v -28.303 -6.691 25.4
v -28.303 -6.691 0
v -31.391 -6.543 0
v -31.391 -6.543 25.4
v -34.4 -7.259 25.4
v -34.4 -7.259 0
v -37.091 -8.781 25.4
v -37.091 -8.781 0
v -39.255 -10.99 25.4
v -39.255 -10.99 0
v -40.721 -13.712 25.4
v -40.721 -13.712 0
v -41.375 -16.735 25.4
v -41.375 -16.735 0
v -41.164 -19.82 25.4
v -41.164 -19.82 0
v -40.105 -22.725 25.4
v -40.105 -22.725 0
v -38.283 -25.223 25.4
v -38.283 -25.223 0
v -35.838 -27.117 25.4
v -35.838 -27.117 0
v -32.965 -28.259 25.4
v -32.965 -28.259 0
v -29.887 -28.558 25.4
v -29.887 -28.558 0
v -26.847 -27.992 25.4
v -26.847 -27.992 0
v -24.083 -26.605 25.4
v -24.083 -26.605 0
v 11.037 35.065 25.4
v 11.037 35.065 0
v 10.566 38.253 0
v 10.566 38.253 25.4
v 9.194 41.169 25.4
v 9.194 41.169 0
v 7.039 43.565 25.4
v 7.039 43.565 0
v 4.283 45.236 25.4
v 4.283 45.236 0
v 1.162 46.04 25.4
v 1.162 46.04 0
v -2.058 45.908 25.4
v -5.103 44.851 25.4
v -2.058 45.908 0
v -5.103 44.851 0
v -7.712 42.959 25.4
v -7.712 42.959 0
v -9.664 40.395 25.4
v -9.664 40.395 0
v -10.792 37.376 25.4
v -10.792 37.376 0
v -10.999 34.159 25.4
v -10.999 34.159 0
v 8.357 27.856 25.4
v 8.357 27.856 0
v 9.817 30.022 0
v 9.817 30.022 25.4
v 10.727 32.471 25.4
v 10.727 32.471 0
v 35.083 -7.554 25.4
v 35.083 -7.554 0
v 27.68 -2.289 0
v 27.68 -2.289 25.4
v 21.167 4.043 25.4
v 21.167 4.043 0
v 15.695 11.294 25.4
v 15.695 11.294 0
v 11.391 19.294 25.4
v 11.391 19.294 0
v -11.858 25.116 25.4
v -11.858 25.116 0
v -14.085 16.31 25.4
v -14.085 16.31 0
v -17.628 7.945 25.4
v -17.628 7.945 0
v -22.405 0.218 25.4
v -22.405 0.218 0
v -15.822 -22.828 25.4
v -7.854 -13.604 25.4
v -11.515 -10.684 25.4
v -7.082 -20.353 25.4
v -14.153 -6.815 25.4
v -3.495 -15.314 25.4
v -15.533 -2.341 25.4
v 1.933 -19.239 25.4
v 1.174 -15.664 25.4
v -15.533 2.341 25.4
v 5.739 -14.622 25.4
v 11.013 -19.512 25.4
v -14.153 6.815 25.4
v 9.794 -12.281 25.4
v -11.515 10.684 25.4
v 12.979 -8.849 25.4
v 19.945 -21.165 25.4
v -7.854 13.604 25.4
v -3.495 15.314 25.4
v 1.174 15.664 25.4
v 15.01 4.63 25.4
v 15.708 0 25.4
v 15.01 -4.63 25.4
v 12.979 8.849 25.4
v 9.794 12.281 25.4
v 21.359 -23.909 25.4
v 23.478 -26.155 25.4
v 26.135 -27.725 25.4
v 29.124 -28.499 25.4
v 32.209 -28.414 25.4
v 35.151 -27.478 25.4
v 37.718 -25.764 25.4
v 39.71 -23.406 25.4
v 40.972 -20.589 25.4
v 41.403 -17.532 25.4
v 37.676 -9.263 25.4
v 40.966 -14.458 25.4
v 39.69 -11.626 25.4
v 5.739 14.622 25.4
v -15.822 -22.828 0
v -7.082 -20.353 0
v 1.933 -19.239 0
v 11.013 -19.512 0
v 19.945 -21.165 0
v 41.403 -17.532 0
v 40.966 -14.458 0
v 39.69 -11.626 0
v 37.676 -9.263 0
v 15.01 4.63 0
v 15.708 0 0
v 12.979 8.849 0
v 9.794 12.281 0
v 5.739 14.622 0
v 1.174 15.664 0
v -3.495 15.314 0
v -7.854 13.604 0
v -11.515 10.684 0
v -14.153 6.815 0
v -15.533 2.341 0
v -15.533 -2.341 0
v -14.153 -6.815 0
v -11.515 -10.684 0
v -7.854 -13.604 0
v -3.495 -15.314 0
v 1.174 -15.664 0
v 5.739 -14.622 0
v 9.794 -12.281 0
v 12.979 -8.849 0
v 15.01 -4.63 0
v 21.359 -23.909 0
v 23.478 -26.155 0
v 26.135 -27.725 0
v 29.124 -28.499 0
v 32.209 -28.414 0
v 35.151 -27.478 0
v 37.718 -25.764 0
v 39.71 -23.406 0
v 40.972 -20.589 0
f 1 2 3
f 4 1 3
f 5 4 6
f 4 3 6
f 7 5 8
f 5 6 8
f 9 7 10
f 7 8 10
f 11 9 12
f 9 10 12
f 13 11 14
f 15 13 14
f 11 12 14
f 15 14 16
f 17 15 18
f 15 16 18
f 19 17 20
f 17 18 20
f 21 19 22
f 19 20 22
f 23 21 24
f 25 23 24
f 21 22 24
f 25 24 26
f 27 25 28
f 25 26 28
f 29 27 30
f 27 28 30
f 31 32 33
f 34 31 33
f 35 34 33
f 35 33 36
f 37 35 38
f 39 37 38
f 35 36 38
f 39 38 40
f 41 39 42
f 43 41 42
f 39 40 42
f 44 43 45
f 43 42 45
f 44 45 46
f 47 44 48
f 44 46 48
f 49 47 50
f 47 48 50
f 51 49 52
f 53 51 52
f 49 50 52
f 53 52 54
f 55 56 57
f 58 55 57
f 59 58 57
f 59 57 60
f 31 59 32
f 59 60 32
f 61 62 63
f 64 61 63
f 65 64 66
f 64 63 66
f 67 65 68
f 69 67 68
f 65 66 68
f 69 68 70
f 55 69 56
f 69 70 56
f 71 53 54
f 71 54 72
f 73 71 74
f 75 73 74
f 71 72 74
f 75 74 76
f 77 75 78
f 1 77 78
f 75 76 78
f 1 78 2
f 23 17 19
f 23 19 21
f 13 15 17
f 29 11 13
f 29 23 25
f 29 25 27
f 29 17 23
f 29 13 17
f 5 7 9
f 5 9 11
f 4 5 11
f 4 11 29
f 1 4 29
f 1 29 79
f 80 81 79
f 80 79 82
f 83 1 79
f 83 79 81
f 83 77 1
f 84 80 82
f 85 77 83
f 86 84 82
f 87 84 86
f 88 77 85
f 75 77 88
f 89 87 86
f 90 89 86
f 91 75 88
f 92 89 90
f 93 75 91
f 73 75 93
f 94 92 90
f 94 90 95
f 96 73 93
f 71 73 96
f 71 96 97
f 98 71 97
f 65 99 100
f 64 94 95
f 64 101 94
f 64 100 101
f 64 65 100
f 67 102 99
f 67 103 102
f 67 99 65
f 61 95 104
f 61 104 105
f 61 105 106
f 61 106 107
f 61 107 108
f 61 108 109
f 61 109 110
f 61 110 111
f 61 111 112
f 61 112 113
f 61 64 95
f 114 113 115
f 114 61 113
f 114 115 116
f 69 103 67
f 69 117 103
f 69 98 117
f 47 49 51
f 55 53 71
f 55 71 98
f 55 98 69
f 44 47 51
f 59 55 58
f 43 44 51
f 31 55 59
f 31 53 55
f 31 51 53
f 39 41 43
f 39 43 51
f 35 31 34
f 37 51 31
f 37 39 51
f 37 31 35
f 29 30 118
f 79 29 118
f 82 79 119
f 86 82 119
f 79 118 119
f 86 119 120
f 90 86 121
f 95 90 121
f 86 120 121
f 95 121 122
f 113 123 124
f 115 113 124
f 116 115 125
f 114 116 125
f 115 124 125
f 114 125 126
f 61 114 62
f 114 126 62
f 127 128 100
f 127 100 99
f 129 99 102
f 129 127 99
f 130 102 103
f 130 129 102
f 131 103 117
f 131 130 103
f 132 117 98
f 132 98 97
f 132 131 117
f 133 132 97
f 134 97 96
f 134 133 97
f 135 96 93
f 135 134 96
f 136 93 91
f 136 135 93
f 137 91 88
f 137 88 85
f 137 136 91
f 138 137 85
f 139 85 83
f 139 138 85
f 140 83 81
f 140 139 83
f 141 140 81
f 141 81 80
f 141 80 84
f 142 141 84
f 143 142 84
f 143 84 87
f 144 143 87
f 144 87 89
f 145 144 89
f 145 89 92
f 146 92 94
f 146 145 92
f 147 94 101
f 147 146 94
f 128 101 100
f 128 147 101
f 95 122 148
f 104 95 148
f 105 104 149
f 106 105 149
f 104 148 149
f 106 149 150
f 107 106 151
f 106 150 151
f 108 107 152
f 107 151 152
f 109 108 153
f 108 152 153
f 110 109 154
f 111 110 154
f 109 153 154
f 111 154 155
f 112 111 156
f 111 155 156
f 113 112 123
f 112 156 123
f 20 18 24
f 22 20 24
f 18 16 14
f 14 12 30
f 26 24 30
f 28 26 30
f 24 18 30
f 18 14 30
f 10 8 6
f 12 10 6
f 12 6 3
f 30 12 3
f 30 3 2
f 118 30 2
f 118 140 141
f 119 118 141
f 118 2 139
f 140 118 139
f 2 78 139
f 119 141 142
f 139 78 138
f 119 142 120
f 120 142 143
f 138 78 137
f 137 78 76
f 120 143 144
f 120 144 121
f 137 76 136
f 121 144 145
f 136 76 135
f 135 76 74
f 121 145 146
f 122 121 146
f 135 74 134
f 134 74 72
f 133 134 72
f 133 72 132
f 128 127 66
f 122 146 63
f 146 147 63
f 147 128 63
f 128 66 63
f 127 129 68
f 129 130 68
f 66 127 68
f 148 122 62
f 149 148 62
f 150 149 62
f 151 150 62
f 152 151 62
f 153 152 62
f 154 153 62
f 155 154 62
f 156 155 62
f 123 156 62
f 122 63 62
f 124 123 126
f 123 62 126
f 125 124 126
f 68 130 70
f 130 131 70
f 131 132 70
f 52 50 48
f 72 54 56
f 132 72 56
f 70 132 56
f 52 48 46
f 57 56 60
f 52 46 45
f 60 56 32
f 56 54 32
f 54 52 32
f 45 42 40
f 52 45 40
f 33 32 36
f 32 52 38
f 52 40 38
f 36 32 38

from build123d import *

# Parameters (mm, degrees)
F0_R     = 15.708112
F1_DEPTH = 25.4


with BuildPart() as f1:
    # F0 (on Top) → F1 (new body)
    with BuildSketch(Plane.XY):
        with BuildLine():
            ThreePointArc((8.357053, 27.856014), (10.344975, 31.219382), (11.036502, 35.064623))
            ThreePointArc((11.036502, 35.064623), (-0.452947, 46.091827), (-10.999324, 34.159493))
            ThreePointArc((-10.999324, 34.159493), (-3.417435, 24.570552), (8.357053, 27.856014))
        make_face()
        with BuildLine():
            ThreePointArc((8.357053, 27.856014), (-3.417435, 24.570552), (-10.999324, 34.159493))
            ThreePointArc((-10.999324, 34.159493), (-15.69672, 12.059533), (-28.302542, -6.690586))
            ThreePointArc((-28.302542, -6.690586), (-21.864291, -10.49592), (-19.330352, -17.532311))
            ThreePointArc((-19.330352, -17.532311), (-20.590542, -22.65365), (-24.083327, -26.60544))
            ThreePointArc((-24.083327, -26.60544), (-2.595502, -19.623525), (19.945489, -21.165427))
            ThreePointArc((19.945489, -21.165427), (22.987439, -9.325691), (35.082651, -7.554053))
            ThreePointArc((35.082651, -7.554053), (18.292222, 7.563992), (8.357053, 27.856014))
        make_face()
        Circle(F0_R, mode=Mode.SUBTRACT)
        with BuildLine():
            ThreePointArc((-19.330352, -17.532311), (-21.864291, -10.49592), (-28.302542, -6.690586))
            ThreePointArc((-28.302542, -6.690586), (-41.163704, -19.819761), (-24.083327, -26.60544))
            ThreePointArc((-24.083327, -26.60544), (-20.590542, -22.65365), (-19.330352, -17.532311))
        make_face()
        with BuildLine():
            ThreePointArc((41.403357, -17.532311), (39.69022, -11.626446), (35.082651, -7.554053))
            ThreePointArc((35.082651, -7.554053), (22.987439, -9.325691), (19.945489, -21.165427))
            ThreePointArc((19.945489, -21.165427), (32.209266, -28.413943), (41.403357, -17.532311))
        make_face()
    extrude(amount=F1_DEPTH)


solid = f1.part
